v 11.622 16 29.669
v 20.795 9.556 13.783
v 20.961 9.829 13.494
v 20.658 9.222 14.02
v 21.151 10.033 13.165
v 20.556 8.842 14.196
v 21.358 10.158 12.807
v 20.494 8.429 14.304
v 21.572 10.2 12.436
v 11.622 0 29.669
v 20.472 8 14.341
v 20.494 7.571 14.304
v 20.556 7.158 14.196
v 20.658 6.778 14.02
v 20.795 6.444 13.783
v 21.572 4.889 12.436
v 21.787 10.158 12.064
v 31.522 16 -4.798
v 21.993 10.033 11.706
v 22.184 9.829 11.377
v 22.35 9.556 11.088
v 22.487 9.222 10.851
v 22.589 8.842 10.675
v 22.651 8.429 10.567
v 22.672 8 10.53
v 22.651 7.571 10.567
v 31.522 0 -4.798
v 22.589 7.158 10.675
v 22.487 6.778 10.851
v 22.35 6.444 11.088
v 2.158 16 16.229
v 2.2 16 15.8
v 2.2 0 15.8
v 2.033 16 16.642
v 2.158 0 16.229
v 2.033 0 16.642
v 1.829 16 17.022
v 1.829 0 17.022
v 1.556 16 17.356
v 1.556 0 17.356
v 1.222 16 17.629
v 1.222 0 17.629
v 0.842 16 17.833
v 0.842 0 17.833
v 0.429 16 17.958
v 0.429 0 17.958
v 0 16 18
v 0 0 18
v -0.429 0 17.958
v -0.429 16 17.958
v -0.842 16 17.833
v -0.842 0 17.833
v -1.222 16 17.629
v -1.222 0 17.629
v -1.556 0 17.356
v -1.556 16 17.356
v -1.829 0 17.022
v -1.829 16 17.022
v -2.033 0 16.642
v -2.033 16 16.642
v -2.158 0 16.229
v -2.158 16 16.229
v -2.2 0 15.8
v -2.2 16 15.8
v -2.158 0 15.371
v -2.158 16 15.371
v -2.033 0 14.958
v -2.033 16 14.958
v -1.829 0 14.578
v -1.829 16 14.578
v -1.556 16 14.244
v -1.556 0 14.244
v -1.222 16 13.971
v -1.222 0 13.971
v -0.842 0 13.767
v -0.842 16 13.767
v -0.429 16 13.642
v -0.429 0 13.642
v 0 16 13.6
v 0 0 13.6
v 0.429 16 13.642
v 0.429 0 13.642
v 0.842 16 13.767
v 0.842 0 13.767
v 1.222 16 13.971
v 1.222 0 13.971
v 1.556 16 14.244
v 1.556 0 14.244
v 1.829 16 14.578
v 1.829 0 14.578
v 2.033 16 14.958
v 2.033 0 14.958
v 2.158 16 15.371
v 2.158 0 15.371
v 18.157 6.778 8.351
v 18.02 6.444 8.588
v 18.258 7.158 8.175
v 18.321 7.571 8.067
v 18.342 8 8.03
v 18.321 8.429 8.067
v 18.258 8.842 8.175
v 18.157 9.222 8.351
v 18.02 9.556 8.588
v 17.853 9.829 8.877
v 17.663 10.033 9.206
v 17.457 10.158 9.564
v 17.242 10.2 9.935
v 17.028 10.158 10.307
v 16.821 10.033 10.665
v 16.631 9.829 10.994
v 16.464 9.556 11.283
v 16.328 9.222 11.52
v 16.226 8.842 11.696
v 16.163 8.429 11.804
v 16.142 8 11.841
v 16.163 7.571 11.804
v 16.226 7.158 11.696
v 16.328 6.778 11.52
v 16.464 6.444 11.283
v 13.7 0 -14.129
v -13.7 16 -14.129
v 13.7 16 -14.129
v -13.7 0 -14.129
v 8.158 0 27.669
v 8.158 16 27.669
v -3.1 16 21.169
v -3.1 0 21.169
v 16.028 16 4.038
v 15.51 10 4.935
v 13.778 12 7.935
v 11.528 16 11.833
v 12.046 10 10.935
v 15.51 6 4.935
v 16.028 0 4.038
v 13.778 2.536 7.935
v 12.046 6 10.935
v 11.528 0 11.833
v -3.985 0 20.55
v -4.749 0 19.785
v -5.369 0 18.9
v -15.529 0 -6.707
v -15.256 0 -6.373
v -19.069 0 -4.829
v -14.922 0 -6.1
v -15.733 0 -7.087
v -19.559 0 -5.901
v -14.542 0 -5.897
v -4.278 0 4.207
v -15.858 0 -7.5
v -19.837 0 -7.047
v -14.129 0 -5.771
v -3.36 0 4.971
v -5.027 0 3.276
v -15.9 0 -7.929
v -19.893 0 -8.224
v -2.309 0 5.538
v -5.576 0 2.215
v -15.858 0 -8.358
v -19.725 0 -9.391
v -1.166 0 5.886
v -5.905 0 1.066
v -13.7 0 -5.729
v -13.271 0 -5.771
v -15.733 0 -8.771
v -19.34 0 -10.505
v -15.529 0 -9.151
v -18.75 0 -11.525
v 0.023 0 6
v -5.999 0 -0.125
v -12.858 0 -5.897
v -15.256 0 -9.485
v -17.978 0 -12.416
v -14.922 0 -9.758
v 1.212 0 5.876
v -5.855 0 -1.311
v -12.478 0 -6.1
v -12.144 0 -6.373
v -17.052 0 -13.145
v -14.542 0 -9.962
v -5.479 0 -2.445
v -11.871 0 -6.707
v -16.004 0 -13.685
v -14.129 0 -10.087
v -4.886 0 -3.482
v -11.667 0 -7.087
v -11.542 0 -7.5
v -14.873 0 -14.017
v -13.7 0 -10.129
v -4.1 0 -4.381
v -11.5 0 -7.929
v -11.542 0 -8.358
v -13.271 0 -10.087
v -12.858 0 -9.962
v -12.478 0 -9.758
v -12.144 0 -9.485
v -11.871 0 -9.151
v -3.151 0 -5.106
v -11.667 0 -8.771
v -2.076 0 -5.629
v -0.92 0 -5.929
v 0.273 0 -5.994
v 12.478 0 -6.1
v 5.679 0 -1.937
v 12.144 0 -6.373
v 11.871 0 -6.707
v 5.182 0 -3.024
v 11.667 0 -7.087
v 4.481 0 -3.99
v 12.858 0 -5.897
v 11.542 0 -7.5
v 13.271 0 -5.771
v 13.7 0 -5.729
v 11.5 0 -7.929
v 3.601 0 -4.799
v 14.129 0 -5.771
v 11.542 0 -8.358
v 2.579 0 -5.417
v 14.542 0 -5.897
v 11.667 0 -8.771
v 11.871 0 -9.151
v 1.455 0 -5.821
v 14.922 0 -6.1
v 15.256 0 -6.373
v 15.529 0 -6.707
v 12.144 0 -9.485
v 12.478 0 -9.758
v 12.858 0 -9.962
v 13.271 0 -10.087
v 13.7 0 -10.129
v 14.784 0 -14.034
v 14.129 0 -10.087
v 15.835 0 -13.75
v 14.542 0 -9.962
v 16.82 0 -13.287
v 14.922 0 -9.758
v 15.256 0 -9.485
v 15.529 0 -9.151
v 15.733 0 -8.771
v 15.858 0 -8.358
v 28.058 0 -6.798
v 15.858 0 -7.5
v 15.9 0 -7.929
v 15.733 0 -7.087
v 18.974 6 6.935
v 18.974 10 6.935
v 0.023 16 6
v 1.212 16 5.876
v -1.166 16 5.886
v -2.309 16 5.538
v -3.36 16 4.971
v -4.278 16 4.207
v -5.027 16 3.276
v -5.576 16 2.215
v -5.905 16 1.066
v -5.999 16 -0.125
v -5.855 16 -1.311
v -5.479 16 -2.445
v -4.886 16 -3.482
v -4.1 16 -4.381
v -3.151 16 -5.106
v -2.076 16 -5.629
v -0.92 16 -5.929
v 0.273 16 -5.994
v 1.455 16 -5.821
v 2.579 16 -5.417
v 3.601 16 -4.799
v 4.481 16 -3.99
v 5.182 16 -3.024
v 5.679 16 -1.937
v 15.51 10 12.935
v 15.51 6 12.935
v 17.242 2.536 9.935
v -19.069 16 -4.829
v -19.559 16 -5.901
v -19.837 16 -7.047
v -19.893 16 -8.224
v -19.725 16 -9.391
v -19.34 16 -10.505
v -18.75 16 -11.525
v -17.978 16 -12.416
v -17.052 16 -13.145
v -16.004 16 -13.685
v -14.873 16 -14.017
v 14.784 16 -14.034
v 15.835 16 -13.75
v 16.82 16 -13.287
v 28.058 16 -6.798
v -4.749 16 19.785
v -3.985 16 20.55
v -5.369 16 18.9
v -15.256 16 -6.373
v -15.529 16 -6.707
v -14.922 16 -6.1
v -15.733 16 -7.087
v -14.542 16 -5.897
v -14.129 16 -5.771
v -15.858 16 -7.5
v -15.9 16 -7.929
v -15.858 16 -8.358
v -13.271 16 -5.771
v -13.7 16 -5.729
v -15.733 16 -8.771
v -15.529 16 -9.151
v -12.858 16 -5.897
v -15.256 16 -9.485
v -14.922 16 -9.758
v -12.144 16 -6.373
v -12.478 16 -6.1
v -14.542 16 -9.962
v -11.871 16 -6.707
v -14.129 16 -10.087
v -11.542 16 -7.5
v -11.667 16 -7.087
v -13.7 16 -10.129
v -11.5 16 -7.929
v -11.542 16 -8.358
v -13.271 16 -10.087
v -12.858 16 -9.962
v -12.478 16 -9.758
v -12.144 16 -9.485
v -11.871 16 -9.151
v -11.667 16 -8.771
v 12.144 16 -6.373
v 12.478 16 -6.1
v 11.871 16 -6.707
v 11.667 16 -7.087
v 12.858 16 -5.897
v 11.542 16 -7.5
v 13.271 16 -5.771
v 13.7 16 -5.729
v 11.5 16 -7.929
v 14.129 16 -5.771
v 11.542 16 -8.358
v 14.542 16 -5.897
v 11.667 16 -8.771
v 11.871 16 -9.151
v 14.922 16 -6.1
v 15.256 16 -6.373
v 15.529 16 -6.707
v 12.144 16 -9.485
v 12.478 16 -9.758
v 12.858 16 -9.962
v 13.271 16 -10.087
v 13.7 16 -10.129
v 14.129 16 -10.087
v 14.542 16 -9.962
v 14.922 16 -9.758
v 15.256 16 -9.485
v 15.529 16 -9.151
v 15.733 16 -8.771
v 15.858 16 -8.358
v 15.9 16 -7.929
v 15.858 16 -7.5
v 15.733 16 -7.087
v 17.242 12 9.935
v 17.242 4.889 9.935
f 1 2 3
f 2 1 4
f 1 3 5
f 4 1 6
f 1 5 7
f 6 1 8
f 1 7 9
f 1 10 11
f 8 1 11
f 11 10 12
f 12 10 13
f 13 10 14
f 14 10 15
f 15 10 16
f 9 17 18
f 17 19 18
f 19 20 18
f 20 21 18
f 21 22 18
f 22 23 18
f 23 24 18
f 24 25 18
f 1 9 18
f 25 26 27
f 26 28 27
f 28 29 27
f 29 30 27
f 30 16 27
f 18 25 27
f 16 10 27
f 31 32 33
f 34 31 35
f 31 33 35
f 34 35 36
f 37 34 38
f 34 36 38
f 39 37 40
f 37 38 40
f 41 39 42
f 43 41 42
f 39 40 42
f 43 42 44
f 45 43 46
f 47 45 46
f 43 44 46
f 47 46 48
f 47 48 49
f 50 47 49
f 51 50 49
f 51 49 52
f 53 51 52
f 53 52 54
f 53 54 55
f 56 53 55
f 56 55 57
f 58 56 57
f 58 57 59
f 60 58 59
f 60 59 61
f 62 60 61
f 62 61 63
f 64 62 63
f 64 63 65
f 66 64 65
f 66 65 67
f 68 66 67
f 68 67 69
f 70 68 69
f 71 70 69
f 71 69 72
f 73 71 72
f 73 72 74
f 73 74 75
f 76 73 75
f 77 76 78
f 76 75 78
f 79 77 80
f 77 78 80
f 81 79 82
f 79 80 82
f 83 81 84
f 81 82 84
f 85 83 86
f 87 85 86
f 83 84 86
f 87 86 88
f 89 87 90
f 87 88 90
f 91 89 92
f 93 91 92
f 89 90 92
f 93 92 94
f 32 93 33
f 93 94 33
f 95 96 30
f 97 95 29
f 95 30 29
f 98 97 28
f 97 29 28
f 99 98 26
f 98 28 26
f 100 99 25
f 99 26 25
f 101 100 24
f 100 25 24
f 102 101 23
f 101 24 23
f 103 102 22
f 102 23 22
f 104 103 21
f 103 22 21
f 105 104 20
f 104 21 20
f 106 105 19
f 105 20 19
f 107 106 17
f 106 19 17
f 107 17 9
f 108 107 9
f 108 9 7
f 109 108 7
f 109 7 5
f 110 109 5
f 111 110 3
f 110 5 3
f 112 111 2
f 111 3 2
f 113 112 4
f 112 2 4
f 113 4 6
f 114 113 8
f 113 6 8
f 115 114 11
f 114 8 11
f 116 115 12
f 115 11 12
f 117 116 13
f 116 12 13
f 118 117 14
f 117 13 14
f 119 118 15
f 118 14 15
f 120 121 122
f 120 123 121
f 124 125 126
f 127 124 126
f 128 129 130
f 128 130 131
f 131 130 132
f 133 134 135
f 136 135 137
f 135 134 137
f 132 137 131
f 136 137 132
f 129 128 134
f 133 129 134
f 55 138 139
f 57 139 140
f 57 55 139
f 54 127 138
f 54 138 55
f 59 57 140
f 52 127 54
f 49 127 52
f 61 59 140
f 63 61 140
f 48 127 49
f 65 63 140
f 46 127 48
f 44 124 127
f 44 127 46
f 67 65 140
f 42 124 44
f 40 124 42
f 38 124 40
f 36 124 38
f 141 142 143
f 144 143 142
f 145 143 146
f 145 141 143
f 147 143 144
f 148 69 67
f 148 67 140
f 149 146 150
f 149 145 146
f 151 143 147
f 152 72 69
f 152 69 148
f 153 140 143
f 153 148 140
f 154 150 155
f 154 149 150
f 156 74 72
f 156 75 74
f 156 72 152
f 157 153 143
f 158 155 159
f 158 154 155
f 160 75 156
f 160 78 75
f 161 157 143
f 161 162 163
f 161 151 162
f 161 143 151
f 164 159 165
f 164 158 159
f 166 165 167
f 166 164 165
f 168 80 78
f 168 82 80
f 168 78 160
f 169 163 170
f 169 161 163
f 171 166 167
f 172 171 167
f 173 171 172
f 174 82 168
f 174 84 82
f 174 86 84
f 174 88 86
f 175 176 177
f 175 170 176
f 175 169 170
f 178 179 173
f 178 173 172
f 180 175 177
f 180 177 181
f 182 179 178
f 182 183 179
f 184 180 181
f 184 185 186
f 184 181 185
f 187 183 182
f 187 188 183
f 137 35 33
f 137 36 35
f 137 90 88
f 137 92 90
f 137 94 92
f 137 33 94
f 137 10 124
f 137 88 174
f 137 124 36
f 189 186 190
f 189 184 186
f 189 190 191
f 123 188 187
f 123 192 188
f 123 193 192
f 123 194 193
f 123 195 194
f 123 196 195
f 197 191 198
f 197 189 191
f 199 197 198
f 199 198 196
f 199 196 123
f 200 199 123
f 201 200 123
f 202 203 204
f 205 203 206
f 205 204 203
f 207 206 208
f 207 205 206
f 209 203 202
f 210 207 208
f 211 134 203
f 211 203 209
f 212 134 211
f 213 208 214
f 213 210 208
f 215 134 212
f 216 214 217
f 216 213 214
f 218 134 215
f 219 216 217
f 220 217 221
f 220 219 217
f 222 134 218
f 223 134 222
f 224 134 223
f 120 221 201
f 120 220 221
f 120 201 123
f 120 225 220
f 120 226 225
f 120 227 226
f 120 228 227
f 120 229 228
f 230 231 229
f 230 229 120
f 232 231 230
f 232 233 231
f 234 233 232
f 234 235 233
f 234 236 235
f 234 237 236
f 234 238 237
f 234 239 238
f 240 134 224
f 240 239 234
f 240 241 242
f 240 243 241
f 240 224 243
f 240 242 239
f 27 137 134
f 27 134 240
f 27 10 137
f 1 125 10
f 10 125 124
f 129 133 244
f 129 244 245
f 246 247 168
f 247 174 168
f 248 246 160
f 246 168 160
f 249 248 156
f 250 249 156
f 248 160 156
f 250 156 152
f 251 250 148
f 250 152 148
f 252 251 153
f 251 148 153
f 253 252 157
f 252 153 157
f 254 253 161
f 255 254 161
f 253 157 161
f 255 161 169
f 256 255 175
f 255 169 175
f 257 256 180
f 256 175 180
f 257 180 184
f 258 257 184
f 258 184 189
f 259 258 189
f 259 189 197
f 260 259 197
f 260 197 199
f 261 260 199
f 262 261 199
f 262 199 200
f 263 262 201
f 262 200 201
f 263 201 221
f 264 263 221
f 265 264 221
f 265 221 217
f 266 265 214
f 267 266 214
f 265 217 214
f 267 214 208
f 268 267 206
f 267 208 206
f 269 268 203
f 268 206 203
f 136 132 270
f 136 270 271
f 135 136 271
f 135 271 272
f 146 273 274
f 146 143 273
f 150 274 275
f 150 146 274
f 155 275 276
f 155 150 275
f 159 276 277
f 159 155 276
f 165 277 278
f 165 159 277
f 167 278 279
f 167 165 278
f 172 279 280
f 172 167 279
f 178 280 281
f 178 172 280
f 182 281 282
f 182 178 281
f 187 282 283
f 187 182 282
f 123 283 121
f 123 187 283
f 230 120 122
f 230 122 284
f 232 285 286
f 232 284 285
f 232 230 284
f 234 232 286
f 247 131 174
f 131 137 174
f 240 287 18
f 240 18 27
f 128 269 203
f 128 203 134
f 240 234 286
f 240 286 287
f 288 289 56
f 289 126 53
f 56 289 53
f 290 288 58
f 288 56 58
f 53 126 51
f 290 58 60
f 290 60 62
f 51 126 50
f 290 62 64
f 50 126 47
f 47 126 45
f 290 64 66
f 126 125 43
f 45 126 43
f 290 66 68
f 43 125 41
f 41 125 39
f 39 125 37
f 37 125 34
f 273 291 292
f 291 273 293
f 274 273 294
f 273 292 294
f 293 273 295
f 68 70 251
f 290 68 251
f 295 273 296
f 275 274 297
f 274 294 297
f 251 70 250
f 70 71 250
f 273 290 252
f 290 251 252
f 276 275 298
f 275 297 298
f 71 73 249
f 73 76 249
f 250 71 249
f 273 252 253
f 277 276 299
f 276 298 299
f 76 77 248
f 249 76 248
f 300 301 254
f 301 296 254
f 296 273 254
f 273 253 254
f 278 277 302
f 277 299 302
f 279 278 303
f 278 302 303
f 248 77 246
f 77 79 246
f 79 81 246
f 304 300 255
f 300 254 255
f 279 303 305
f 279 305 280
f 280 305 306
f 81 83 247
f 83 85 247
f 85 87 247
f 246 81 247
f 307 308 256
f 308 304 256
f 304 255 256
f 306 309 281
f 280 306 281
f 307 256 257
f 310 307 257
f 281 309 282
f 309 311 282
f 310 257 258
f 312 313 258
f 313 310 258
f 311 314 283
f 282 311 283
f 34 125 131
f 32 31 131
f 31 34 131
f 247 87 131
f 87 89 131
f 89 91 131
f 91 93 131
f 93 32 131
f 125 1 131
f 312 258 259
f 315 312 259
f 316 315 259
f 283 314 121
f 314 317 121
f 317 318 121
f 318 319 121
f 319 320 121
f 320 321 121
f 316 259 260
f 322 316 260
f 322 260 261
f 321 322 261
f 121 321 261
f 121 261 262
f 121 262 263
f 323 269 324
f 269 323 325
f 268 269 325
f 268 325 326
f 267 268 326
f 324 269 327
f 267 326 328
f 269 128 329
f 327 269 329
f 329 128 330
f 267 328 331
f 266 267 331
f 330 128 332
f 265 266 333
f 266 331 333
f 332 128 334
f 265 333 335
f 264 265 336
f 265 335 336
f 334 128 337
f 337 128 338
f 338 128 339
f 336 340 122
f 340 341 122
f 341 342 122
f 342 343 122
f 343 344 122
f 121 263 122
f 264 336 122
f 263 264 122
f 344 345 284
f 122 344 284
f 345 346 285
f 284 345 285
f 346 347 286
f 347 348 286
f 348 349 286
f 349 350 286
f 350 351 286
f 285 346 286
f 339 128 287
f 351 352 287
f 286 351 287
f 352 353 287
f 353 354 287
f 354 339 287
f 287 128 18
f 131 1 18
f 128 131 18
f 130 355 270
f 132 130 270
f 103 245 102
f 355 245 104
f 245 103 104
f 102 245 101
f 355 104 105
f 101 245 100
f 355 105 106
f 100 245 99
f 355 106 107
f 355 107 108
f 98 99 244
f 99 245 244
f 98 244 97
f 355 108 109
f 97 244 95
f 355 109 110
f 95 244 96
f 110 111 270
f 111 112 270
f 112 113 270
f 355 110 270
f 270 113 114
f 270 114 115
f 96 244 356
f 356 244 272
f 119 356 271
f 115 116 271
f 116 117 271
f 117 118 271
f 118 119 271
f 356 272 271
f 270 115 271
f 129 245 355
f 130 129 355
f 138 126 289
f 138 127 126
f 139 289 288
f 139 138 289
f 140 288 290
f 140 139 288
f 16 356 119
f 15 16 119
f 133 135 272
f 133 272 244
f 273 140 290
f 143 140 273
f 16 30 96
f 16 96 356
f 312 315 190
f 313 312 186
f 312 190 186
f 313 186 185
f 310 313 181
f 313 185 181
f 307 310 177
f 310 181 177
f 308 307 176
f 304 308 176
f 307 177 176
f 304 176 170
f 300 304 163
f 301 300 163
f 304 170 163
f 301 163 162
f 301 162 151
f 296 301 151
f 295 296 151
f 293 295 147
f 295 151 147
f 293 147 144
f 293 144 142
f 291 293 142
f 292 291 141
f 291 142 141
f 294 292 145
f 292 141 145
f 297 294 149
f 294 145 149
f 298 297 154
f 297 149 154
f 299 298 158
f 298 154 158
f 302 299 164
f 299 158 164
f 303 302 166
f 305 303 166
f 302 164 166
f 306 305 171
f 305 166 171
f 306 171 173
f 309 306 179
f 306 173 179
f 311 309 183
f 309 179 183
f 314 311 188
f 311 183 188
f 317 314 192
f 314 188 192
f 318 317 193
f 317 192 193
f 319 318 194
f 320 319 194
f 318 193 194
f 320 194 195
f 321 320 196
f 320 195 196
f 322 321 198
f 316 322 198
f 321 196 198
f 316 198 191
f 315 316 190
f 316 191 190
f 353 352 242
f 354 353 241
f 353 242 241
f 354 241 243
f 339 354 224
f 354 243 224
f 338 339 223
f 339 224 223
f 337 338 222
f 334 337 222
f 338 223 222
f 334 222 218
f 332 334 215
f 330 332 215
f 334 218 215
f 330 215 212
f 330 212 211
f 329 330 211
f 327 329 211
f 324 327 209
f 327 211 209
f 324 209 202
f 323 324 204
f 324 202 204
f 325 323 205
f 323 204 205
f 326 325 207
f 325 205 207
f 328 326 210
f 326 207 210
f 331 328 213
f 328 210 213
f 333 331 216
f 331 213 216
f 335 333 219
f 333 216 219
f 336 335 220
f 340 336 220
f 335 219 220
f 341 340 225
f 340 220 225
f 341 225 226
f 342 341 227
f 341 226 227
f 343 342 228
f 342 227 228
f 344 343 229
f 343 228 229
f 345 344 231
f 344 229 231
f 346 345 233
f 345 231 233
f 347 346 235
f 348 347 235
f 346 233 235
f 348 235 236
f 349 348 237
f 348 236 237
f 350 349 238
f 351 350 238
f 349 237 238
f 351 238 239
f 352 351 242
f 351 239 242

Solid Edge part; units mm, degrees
sketch "Sketch1" plane through (0, 0, 0) normal (0, -1, 0) x (1, 0, 0)
  line L0 (-5.3694, 18.9) -> (-19.0694, -4.8291)
  arc A0 (-13.7, -14.1291) -> (-19.0694, -4.8291) centre (-13.7, -7.9291) cw
  line L1 (-13.7, -14.1291) -> (13.7, -14.1291)
  arc A1 (19.0694, -4.8291) -> (13.7, -14.1291) centre (13.7, -7.9291) cw
  line L2 (5.3694, 18.9) -> (19.0694, -4.8291)
  arc A2 (-5.3694, 18.9) -> (5.3694, 18.9) centre (0, 15.8) cw
  dimension "D1" = 5.3694
extrude "Protrusion1" add sketch "Sketch1" against normal blind 16
sketch "Sketch2" plane through (0, 0, 0) normal (0, -1, 0) x (1, 0, 0)
  circle A0 centre (-13.7, -7.9291) radius 2.2
  circle A1 centre (13.7, -7.9291) radius 2.2
  circle A2 centre (0, 15.8) radius 2.2
  dimension "D1" = 24
  dimension "D2" = 4
  dimension "D3" = 4.4
  dimension "D4" = 6.2
  dimension "D5" = 6.2
  dimension "D6" = 4.4
  dimension "D7" = 6.2
  dimension "D8" = 27.4
  dimension "D9" = 27.4
  dimension "D10" = 27.4
extrude "Cutout1" cut sketch "Sketch2" against normal blind 457.8755
sketch "Sketch3" plane through (0, 0, 0) normal (0, -1, 0) x (1, 0, 0)
  circle A0 centre (0, 0) radius 6
extrude "Cutout2" cut sketch "Sketch3" against normal blind 434.4917
sketch "Sketch4" plane through (0, 0, 3.9355) normal (0, -1, 0) x (-0.5, 0, 0.866)
  line L0 (-23.325, -5.9323) -> (-23.325, -18.9323)
  line L1 (-23.325, -18.9323) -> (16.475, -18.9323)
  line L2 (16.475, -18.9323) -> (16.475, -5.9323)
  line L3 (12.7755, -8.7037) -> (16.475, -5.9323)
  line L4 (-20.9306, -8.7037) -> (12.7755, -8.7037)
  line L5 (-20.9306, -5.9323) -> (-20.9306, -8.7037)
  line L6 (-23.325, -5.9323) -> (-20.9306, -5.9323)
  dimension "D1" = 13
extrude "Protrusion2" add sketch "Sketch4" against normal up to vertex (16 mm away)
sketch "Sketch5" plane through (3.1086, 0, 6.2098) normal (0, -1, 0) x (-0.5, 0, 0.866)
  line L0 (-8.3403, 2.4623) -> (-8.3403, -10.1029)
  line L1 (-8.3403, -10.1029) -> (0.6597, -10.1029)
  line L2 (0.6597, -10.1029) -> (0.6597, 2.4623)
  line L3 (0.6597, 2.4623) -> (-8.3403, 2.4623)
  dimension "D1" = 7
  dimension "D2" = 7
  dimension "D3" = 5
extrude "ExtrudedCutout_18" cut sketch "Sketch5" against normal blind 196.9446
sketch "Sketch6" plane through (13.7782, 8, 7.9355) normal (-0.866, 0, -0.5) x (0, -1, 0)
  line L0 (-2, 3.4641) -> (2, 3.4641)
  line L1 (-4, 0) -> (-2, 3.4641)
  line L2 (-2, -3.4641) -> (-4, 0)
  line L3 (2, -3.4641) -> (-2, -3.4641)
  line L4 (5.4641, 0) -> (2, -3.4641)
  line L5 (2, 3.4641) -> (5.4641, 0)
extrude "ExtrudedCutout_19" cut sketch "Sketch6" against normal blind 4
sketch "Sketch7" plane through (18.1083, 8, 10.4355) normal (0.866, 0, 0.5) x (-0.5, 0, 0.866)
  line L0 (-19.9, 8) -> (19.9, 8)
  line L1 (19.9, -8) -> (19.9, 8)
  line L2 (-19.9, -8) -> (19.9, -8)
  line L3 (-19.9, -8) -> (-19.9, 8)
extrude "ExtrudedProtrusion_14" add sketch "Sketch7" along normal blind 4
sketch "Sketch8" plane through (21.5724, 8, 12.4355) normal (0.866, 0, 0.5) x (-0.5, 0, 0.866)
  line L0 (-1.5556, 1.5556) -> (0, 3.1113)
  line L1 (0, 3.1113) -> (1.5556, 1.5556)
  arc A0 (1.5556, 1.5556) -> (-1.5556, 1.5556) centre (0, 0) cw
extrude "ExtrudedCutout_20" cut sketch "Sketch8" against normal blind 25.1595
